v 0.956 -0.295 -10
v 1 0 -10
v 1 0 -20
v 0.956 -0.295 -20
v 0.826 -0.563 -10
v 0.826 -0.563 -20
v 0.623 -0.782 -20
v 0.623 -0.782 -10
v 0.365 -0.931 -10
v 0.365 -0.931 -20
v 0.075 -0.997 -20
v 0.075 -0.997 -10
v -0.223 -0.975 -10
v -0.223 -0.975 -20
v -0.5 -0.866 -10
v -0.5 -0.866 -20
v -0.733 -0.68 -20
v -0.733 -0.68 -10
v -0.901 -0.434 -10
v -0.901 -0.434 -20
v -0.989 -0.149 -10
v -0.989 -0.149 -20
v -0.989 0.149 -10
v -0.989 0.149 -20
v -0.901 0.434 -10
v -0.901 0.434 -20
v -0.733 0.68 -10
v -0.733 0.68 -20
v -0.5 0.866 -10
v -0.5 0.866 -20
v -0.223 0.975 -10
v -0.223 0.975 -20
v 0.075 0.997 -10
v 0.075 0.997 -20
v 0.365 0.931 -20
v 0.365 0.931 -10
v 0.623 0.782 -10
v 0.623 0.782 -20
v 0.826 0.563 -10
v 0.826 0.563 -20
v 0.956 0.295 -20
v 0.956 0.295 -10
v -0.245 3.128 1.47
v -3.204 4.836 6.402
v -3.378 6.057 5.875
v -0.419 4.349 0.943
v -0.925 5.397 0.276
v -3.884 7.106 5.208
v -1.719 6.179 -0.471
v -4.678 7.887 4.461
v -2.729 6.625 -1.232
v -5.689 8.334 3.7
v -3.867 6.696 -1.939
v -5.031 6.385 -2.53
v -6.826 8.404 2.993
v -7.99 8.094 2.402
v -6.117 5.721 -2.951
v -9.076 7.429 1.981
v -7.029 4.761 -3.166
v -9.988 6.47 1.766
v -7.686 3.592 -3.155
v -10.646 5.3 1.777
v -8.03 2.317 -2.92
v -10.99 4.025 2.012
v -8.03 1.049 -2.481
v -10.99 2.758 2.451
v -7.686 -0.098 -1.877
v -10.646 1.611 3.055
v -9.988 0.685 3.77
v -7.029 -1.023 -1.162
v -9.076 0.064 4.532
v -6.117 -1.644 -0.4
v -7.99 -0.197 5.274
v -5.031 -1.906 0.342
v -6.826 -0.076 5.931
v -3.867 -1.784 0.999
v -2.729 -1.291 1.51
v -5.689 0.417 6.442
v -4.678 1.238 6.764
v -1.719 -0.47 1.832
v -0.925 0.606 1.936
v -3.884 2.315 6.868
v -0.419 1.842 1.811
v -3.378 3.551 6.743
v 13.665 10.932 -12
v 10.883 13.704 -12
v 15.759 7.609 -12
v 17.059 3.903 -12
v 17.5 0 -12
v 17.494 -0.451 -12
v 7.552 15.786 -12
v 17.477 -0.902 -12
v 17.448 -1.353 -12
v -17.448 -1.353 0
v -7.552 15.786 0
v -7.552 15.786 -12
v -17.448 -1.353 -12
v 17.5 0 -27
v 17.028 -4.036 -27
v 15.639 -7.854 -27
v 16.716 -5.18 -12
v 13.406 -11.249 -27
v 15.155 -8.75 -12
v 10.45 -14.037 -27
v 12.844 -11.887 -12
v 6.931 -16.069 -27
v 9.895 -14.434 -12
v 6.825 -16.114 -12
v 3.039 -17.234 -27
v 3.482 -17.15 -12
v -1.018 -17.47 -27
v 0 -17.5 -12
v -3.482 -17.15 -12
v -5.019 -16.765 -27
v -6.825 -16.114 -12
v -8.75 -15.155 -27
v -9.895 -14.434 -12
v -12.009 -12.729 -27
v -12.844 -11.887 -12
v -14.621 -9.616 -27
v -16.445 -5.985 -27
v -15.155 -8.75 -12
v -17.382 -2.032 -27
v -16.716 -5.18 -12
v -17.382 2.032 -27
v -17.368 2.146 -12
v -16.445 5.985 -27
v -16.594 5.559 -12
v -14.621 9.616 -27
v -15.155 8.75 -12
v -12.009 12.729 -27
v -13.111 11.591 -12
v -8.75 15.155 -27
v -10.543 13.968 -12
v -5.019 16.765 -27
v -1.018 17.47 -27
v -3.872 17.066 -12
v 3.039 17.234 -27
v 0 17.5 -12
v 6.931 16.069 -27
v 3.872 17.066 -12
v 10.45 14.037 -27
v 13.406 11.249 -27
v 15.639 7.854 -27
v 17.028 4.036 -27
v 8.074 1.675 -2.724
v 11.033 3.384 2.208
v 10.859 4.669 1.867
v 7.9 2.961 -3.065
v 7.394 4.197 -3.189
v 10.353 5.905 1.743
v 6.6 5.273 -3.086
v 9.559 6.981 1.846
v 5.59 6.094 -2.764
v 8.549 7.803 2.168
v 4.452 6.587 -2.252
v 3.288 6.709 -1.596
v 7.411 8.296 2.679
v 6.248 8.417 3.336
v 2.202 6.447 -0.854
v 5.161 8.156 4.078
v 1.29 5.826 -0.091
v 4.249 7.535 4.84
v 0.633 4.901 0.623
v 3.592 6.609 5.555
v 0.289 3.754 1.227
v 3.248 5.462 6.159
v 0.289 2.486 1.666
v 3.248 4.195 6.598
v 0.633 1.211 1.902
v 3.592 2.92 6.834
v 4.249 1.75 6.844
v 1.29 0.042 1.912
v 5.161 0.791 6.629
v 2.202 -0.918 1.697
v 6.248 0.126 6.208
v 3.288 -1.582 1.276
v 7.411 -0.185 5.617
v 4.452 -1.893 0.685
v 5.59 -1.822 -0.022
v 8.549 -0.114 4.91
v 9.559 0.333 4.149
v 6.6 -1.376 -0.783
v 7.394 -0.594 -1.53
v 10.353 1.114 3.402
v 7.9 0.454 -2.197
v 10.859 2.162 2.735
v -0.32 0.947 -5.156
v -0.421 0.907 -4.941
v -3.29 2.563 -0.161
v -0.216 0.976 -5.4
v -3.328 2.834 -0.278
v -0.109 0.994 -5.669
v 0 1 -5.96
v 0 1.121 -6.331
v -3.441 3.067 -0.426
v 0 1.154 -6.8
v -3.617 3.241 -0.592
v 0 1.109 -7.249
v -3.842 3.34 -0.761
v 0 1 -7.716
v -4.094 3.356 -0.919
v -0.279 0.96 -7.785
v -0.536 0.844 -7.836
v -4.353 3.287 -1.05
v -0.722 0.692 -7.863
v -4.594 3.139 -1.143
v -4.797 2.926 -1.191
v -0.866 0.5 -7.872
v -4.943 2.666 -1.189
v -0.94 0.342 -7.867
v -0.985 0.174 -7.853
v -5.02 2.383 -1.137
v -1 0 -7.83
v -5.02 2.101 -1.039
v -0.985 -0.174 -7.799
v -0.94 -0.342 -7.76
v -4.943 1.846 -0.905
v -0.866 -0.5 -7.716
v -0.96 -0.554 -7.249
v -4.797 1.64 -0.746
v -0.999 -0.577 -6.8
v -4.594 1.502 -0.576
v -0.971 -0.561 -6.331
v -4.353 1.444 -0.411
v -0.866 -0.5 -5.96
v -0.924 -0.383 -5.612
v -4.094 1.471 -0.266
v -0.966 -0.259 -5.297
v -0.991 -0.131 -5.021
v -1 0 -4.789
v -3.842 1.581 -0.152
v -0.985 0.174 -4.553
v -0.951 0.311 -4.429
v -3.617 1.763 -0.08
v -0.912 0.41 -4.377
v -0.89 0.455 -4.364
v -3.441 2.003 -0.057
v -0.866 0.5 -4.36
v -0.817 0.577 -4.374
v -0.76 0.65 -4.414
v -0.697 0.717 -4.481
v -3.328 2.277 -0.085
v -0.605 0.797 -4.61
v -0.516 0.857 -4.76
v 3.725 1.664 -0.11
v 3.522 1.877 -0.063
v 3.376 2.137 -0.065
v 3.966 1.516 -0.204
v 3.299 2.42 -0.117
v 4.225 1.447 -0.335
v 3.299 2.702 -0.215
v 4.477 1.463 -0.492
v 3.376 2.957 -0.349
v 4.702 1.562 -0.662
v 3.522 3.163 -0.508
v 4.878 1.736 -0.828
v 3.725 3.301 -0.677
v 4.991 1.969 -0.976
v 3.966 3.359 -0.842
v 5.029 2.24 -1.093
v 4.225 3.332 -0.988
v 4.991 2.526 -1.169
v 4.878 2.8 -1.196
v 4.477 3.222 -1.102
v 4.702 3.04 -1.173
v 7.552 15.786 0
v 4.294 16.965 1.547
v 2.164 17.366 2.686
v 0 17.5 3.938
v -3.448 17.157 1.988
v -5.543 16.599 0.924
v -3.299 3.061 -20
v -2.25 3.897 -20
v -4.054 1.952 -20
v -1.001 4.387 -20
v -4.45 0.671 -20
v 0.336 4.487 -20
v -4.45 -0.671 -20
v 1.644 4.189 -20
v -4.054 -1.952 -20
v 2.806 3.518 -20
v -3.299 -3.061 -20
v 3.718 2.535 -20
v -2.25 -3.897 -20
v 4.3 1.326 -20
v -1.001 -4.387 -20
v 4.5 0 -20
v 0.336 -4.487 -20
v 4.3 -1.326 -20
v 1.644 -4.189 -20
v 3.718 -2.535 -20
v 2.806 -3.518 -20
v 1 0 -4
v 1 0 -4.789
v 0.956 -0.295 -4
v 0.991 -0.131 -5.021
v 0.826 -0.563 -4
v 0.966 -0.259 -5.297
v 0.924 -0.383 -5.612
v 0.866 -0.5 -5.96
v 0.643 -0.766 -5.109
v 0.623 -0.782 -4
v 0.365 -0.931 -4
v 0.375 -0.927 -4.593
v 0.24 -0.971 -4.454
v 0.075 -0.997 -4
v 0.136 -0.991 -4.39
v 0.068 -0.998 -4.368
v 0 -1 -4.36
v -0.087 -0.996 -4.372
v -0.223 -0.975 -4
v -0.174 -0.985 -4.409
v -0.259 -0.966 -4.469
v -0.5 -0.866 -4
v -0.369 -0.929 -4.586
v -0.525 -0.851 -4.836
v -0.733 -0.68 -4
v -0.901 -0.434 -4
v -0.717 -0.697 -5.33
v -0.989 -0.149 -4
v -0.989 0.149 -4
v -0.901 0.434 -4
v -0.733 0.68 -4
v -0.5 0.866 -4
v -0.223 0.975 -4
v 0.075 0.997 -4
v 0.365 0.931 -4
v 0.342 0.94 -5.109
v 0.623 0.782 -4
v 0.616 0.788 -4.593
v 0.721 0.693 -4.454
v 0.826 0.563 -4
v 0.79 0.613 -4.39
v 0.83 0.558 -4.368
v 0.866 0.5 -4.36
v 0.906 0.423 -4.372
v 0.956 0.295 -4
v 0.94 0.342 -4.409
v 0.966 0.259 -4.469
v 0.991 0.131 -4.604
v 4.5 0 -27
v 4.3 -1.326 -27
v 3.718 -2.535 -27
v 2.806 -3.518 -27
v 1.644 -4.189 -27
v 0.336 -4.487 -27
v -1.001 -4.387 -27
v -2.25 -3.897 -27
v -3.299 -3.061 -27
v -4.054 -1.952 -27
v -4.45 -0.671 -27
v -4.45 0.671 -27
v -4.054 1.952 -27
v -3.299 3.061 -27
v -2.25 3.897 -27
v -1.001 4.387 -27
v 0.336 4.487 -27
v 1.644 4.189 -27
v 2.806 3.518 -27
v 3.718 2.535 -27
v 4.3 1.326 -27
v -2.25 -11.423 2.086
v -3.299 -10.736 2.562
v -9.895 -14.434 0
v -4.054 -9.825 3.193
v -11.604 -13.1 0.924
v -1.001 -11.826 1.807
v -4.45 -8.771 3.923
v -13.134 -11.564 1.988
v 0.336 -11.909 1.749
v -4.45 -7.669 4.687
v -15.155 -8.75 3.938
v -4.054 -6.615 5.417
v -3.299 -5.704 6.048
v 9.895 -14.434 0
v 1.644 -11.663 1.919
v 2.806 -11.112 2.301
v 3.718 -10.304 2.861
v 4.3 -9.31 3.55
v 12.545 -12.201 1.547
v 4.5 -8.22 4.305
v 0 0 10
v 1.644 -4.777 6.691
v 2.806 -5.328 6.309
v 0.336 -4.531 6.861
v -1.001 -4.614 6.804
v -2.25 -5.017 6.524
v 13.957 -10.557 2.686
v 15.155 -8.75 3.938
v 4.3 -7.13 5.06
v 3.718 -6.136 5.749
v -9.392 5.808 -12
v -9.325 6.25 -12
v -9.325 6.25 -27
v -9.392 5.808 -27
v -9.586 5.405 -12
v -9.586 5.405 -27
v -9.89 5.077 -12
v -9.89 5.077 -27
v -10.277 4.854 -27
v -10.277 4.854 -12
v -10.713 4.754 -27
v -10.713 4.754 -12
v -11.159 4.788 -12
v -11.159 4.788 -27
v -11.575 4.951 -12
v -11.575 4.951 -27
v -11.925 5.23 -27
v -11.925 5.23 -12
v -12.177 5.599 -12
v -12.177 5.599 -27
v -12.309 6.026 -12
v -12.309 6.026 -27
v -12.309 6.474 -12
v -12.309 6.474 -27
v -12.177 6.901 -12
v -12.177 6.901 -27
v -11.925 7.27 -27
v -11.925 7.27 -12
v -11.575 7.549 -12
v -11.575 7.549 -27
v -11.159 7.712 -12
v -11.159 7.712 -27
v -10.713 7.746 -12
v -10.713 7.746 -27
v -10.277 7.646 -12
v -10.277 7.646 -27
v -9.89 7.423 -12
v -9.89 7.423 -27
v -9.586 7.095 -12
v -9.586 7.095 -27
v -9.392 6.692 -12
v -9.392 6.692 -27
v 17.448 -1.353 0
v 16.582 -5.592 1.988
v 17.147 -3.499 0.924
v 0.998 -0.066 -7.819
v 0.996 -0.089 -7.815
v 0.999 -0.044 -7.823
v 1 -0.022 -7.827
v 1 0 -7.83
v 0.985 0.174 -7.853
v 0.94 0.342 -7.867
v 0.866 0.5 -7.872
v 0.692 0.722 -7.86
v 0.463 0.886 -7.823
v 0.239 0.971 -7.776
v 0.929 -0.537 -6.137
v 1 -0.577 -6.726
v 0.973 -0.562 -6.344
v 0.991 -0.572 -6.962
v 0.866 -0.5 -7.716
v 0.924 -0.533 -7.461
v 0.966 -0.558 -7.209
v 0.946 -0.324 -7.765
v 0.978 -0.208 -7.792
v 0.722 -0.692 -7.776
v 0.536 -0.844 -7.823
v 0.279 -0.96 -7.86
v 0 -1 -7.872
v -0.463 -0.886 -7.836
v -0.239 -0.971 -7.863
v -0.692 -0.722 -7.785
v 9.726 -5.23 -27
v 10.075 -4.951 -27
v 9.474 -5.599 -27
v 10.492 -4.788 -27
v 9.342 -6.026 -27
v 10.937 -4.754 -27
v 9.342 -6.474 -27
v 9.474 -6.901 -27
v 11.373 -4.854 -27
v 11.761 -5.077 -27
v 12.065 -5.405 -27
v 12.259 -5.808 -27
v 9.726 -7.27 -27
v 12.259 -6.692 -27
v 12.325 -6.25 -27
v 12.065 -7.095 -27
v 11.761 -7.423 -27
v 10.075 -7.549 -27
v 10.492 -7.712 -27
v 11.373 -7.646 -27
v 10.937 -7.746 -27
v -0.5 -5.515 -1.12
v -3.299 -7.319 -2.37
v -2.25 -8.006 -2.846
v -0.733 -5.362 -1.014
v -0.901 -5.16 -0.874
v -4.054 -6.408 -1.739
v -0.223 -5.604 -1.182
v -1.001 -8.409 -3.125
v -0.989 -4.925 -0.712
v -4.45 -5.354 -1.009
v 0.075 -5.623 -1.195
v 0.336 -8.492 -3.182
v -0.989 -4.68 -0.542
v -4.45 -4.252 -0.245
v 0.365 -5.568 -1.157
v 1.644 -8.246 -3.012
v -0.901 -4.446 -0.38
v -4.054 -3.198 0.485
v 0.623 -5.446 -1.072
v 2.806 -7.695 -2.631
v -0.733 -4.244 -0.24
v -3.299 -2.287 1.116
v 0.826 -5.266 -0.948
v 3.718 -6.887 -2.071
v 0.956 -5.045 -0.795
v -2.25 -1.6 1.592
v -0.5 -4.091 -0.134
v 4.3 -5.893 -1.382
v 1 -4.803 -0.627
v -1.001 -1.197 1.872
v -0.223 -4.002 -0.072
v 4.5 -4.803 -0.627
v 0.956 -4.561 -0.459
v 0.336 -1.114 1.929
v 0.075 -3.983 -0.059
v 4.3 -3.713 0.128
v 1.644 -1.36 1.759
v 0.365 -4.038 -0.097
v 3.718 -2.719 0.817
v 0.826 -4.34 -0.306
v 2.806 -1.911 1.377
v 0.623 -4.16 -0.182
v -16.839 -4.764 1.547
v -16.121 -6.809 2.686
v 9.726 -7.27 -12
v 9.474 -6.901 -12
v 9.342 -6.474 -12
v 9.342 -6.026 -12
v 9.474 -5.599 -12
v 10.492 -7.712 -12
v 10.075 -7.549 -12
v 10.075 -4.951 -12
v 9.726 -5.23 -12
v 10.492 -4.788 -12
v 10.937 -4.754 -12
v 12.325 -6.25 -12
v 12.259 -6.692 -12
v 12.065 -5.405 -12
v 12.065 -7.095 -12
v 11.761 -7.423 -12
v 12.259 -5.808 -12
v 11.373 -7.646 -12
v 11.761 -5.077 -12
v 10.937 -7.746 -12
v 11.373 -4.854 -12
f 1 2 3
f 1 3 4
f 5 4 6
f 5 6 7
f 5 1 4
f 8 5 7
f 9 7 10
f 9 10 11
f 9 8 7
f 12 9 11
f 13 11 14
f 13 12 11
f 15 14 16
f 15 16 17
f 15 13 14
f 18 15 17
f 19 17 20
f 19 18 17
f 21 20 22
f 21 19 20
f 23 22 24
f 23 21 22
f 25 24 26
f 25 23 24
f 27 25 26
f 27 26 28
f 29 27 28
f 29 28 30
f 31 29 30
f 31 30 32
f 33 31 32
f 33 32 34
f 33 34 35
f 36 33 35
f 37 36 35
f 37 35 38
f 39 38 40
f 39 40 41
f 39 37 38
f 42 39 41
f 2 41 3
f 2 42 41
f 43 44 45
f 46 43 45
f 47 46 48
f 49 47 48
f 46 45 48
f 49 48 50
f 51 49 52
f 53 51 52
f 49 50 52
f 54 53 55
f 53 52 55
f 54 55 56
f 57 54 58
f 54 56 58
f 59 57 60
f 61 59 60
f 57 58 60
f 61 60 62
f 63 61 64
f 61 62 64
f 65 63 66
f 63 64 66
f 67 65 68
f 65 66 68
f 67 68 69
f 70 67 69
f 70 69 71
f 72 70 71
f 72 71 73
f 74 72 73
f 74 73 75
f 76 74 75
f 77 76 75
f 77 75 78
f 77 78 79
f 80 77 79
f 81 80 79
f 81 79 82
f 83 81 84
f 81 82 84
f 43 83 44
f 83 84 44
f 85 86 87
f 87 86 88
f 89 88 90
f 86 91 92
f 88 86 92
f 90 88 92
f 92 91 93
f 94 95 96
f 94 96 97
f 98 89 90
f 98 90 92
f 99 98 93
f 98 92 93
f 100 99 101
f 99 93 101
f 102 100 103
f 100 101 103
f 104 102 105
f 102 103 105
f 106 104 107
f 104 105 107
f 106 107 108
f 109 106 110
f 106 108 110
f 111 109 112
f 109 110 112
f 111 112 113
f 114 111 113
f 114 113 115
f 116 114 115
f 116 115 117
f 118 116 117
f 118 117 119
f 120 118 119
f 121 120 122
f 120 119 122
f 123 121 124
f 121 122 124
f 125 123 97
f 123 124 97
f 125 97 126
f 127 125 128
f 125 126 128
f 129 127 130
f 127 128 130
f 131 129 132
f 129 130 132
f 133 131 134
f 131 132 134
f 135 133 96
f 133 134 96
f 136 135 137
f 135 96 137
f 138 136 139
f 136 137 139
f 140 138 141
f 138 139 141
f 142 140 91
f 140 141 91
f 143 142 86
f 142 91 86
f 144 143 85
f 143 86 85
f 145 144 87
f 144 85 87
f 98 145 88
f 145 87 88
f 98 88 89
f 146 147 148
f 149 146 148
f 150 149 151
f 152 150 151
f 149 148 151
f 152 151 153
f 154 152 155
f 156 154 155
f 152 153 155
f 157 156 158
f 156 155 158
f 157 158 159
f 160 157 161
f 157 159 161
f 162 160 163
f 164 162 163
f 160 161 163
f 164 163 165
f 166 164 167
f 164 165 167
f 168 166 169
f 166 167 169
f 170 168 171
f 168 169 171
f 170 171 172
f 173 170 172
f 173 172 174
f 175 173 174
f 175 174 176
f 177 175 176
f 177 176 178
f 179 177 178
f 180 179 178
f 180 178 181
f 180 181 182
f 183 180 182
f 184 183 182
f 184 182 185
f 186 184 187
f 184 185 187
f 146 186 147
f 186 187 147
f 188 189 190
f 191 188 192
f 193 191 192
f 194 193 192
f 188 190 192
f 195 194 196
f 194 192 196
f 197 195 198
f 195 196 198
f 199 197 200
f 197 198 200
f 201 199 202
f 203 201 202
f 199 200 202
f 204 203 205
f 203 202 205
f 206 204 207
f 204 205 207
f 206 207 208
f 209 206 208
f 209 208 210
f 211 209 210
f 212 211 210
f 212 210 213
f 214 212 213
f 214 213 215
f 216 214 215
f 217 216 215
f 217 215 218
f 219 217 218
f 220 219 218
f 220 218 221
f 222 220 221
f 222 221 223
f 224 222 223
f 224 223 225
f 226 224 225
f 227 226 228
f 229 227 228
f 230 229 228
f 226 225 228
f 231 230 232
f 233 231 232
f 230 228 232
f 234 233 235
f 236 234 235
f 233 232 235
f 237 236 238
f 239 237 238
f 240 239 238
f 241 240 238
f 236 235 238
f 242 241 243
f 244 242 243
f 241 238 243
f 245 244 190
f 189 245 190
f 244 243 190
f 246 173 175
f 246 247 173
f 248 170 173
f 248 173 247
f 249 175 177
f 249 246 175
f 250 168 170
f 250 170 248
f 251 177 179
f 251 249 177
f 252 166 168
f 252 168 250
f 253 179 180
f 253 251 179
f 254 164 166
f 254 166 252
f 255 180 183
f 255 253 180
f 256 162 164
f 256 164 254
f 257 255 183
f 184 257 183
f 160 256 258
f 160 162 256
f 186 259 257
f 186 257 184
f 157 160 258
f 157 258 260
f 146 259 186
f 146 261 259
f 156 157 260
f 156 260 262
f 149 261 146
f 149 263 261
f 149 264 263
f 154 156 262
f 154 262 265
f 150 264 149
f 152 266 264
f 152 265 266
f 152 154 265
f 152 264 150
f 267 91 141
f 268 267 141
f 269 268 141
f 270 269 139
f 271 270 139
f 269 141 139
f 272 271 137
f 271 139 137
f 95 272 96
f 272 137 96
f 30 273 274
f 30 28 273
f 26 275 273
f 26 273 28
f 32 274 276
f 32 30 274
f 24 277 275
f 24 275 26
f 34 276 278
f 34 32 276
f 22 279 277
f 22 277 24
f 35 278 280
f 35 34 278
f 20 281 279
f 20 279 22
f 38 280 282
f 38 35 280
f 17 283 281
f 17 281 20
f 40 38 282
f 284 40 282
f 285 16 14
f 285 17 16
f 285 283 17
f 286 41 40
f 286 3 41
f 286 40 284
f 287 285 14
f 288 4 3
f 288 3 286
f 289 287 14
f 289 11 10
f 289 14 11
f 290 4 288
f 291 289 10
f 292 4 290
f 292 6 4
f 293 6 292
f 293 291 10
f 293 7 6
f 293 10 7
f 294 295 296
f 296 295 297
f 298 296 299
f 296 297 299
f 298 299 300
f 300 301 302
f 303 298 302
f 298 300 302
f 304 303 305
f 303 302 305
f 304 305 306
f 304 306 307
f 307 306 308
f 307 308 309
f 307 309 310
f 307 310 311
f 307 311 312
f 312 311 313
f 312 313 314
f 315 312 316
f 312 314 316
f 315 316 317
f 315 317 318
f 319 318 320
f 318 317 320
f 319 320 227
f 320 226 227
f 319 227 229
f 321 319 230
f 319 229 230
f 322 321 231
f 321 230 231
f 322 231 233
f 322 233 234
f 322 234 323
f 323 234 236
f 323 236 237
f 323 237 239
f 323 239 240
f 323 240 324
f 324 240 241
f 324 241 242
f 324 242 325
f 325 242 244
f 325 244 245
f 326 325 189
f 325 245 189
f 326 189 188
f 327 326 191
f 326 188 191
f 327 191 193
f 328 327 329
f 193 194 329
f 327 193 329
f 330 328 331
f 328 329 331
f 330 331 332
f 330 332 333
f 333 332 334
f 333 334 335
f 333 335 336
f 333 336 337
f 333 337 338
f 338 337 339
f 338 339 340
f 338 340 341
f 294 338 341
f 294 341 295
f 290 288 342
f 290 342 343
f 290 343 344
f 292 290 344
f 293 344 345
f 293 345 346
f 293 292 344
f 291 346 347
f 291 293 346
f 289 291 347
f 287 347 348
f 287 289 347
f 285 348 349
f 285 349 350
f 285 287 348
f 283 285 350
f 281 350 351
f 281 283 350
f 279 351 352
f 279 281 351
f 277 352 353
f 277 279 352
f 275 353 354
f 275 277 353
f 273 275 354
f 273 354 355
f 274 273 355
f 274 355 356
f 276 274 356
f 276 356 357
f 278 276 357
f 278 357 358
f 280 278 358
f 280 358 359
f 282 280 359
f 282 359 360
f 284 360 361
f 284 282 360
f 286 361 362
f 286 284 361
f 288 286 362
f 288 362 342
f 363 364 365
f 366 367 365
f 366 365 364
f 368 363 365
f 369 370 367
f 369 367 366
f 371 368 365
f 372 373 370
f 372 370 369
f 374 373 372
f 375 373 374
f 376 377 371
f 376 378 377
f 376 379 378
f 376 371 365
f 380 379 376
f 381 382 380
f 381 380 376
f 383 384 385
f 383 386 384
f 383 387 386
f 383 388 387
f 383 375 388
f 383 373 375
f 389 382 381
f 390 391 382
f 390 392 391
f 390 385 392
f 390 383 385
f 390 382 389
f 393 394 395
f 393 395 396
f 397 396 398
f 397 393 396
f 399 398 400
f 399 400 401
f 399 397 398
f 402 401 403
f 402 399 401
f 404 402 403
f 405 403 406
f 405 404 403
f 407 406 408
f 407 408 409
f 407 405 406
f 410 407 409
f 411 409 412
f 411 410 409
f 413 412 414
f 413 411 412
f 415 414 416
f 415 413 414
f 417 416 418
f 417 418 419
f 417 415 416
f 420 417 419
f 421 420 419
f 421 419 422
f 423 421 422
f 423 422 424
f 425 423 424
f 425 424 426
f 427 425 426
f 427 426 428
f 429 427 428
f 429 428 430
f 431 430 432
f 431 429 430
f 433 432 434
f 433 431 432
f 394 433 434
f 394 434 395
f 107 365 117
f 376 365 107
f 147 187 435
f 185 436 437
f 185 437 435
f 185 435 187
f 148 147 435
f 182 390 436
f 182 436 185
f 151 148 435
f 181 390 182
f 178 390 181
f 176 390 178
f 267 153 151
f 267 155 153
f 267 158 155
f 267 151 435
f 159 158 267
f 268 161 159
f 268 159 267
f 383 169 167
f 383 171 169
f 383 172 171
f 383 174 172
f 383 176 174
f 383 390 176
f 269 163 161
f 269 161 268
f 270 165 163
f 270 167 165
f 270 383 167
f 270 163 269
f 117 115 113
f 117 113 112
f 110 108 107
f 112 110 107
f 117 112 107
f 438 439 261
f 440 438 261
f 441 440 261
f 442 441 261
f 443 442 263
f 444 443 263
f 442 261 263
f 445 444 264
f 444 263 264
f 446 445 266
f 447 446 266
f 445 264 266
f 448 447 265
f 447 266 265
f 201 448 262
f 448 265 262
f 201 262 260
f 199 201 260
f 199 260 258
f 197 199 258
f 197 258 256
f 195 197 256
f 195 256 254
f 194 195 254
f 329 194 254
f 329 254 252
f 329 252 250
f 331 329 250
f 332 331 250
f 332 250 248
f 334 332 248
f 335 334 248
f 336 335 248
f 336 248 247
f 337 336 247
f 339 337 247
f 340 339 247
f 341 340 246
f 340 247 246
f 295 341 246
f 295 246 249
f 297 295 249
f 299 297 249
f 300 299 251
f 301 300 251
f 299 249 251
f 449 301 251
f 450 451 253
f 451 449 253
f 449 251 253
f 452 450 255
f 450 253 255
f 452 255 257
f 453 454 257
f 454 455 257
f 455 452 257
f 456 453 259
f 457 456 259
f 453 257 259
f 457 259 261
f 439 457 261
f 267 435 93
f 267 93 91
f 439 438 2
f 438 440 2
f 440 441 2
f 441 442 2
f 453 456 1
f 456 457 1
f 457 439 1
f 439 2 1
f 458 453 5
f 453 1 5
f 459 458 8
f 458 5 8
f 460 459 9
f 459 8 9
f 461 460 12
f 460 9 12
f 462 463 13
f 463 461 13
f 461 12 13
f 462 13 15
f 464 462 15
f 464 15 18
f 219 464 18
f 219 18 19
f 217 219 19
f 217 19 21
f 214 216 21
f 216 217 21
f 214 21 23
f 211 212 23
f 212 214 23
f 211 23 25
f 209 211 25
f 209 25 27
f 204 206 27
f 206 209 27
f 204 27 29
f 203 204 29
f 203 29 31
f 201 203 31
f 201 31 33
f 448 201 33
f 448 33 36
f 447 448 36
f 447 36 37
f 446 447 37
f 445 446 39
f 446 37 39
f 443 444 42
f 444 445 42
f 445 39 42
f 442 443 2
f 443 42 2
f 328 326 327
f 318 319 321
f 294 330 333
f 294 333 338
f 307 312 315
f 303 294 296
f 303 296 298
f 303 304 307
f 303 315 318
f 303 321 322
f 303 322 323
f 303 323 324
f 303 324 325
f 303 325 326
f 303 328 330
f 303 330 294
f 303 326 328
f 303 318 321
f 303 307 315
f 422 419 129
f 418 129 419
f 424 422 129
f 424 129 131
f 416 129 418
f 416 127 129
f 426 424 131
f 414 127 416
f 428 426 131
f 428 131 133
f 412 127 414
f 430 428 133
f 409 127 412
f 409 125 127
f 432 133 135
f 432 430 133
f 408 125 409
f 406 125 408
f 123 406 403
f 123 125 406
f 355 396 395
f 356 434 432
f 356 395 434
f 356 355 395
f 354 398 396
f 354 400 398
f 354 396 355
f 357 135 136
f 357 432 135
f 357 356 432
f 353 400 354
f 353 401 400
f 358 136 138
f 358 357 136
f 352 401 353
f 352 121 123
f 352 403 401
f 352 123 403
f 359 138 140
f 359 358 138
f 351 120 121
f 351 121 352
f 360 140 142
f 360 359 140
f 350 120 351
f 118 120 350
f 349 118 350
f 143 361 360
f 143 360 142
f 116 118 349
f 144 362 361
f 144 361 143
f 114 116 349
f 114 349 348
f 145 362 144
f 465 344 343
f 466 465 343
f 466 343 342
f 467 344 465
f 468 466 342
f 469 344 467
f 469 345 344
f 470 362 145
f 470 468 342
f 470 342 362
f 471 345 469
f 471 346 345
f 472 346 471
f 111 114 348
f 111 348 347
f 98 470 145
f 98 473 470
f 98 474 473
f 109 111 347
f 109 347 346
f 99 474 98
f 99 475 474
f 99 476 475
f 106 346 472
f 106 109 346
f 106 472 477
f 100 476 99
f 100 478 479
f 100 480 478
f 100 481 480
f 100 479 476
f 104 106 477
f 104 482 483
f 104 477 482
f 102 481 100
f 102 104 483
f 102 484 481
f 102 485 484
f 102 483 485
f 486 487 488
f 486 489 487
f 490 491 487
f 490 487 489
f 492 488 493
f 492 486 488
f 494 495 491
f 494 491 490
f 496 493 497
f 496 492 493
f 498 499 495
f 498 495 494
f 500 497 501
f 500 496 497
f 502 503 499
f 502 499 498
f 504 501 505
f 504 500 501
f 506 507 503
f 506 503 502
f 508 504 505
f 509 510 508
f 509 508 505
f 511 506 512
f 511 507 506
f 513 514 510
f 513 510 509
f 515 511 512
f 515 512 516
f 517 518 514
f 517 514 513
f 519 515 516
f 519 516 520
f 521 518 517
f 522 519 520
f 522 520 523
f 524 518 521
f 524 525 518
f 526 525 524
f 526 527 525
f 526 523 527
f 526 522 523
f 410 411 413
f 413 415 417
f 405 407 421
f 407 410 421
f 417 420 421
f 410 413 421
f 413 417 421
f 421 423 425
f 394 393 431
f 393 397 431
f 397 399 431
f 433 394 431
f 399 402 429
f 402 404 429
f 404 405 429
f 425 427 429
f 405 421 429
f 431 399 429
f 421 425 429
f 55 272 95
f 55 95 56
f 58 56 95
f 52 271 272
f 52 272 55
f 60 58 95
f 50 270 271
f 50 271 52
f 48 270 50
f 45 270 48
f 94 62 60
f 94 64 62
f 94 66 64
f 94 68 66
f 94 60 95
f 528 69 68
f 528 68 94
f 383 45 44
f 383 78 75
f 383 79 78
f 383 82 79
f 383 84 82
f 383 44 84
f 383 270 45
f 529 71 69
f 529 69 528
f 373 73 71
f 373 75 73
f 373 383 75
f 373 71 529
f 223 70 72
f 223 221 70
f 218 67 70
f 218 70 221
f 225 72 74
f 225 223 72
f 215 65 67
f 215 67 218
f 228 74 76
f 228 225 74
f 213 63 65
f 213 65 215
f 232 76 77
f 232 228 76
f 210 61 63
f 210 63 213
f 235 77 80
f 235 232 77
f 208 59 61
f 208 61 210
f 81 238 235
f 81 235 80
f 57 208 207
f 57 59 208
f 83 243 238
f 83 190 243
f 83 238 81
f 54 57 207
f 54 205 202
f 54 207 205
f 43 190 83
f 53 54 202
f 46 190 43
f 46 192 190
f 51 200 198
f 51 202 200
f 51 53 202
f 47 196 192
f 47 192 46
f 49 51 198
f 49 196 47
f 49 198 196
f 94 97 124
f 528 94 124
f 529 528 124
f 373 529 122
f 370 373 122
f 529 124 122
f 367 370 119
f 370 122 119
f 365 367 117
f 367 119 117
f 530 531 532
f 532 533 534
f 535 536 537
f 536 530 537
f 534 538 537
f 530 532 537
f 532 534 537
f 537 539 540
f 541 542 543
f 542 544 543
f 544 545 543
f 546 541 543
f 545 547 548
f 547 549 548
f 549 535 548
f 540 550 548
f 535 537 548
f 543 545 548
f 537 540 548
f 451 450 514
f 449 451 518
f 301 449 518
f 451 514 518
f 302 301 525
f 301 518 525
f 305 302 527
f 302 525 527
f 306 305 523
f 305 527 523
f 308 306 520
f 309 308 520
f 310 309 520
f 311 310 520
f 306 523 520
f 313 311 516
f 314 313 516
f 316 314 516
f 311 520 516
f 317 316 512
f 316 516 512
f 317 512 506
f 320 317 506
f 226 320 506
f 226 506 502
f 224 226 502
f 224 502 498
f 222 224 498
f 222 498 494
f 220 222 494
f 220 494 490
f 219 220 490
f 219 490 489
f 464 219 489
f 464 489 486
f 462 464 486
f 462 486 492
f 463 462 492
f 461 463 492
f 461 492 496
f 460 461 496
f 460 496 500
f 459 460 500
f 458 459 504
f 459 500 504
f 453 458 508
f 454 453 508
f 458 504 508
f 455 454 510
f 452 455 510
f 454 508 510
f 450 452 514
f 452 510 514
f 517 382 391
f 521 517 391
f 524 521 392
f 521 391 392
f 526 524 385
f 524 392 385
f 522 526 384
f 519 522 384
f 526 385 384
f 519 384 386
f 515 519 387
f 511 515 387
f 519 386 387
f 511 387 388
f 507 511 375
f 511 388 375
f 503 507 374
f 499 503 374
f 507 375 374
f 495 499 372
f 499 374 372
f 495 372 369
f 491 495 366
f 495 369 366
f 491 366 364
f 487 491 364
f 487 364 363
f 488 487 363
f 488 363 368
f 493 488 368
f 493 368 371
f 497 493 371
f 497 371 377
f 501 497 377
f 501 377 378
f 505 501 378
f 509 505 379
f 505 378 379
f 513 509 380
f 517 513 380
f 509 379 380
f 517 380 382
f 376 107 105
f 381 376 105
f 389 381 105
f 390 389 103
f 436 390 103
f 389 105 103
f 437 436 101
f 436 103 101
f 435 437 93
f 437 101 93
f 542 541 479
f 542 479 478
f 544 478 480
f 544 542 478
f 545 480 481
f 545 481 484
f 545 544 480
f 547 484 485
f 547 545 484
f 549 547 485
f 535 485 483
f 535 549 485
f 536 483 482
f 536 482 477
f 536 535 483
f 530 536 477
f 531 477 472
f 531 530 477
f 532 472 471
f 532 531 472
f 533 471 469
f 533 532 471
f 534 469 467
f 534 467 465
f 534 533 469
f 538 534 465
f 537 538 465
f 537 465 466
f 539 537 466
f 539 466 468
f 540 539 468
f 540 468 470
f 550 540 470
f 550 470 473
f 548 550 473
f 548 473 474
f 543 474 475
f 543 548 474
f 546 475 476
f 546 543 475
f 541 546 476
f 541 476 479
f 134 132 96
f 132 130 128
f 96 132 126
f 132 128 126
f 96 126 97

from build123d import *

# Parameters (mm, degrees)
F3_DEPTH       = 12
F8_R           = 1
F9_DEPTH       = 8
F10_R          = 4.5
F11_DEPTH      = 2
F12_R          = 1
F13_REACH      = 37.3532145158
F12_R_2        = 4.5
F14_DEPTH      = 6
F16_END_RADIUS = 1
F15_R          = 1
F16_REACH      = 37.3532145367
F15_R_2        = 4.5
F17_DEPTH      = 6
F19_END_RADIUS = 1
F18_R          = 1
F19_REACH      = 37.3532145367
F18_R_2        = 4.5
F20_DEPTH      = 6
F22_DEPTH      = 25
F23_R          = 17.5
F23_R_2        = 1.5
F23_R_3        = 6.5
F23_R_4        = 4.5
F24_DEPTH      = 15
F25_DEPTH      = 10


with BuildPart() as f3:
    # F2 (on Top) → F3 (new body)
    with BuildSketch(Plane.XY):
        Polygon((25, -14.4337567297), (0, 28.8675134595), (-25, -14.4337567297), align=None)
    extrude(amount=-F3_DEPTH)

    # F3_face (on face) → F6 section 0
    with BuildSketch(Plane.XY, mode=Mode.PRIVATE) as f6_s0:
        Polygon((-25, -14.4337567297), (25, -14.4337567297), (0, 28.8675134595), align=None)
    loft([f6_s0.sketch, Vertex(0, 0, 10)])

    # F8 (on face) → F9 (cut)
    with BuildSketch(Plane(origin=(0, 0, -12), x_dir=(1, 0, 0), z_dir=(0, 0, -1))):
        Circle(F8_R)
    extrude(amount=-F9_DEPTH, mode=Mode.SUBTRACT)

    # F10 (on face) → F11 (cut)
    with BuildSketch(Plane(origin=(0, 0, -12), x_dir=(1, 0, 0), z_dir=(0, 0, -1))):
        Circle(F10_R)
    extrude(amount=-F11_DEPTH, mode=Mode.SUBTRACT)

    f13_end = f3.faces().sort_by_distance((-1, 0, -7))[0]
    # F12 (on face) → F13 (cut, up to a face of the model that its end follows)
    with BuildSketch(Plane(origin=(0, -4.6812183988, 6.7567567568), x_dir=(1, 0, 0), z_dir=(0, -0.5694947975, 0.8219949365))):
        with Locations((0, -4.3050520255)):
            Circle(F12_R)
    f13_long = extrude(amount=-F13_REACH, mode=Mode.PRIVATE)
    add(split(f13_long, bisect_by=f13_end, keep=Keep.BOTTOM, mode=Mode.PRIVATE), mode=Mode.SUBTRACT)

    # F12 (on face) → F14 (cut)
    with BuildSketch(Plane(origin=(0, -4.6812183988, 6.7567567568), x_dir=(1, 0, 0), z_dir=(0, -0.5694947975, 0.8219949365))):
        with Locations((0, -4.3050520255)):
            Circle(F12_R_2)
        with Locations((0, -4.3050520255)):
            Circle(F12_R, mode=Mode.SUBTRACT)
    extrude(amount=-F14_DEPTH, mode=Mode.SUBTRACT)

    f16_end = (Plane(origin=(0, 0, -7), x_dir=(-1, 0, 0), z_dir=(0, 0, -1)) * Cylinder(F16_END_RADIUS, 214.1194850146, mode=Mode.PRIVATE)).faces().sort_by_distance((-1, 0, -7))[0]
    # F15 (on face) → F16 (cut, up to the whole of a round face its end follows)
    with BuildSketch(Plane(origin=(-4.0540540541, 2.3406091994, 6.7567567568), x_dir=(0.8699176724, 0.1614366008, 0.4660273245), z_dir=(-0.4931969619, 0.2847473987, 0.8219949365))):
        with Locations((-3.5228976388, 2.474401982)):
            Circle(F15_R)
    f16_long = extrude(amount=-F16_REACH, mode=Mode.PRIVATE)
    add(split(f16_long, bisect_by=f16_end, keep=Keep.ALL, mode=Mode.PRIVATE).solids().sort_by_distance((-7.1186849681, 4.1099746826, 4.3050520255))[0], mode=Mode.SUBTRACT)

    # F15 (on face) → F17 (cut)
    with BuildSketch(Plane(origin=(-4.0540540541, 2.3406091994, 6.7567567568), x_dir=(0.8699176724, 0.1614366008, 0.4660273245), z_dir=(-0.4931969619, 0.2847473987, 0.8219949365))):
        with Locations((-3.5228976388, 2.474401982)):
            Circle(F15_R_2)
        with Locations((-3.5228976388, 2.474401982)):
            Circle(F15_R, mode=Mode.SUBTRACT)
    extrude(amount=-F17_DEPTH, mode=Mode.SUBTRACT)

    f19_end = (Plane(origin=(0, 0, -7), x_dir=(-1, 0, 0), z_dir=(0, 0, -1)) * Cylinder(F19_END_RADIUS, 214.1194850146, mode=Mode.PRIVATE)).faces().sort_by_distance((-1, 0, -9.9336675042))[0]
    # F18 (on face) → F19 (cut, up to the whole of a round face its end follows)
    with BuildSketch(Plane(origin=(4.0540540541, 2.3406091994, 6.7567567568), x_dir=(0.8699176724, -0.1614366008, -0.4660273245), z_dir=(0.4931969619, 0.2847473987, 0.8219949365))):
        with Locations((3.5228976388, 2.474401982)):
            Circle(F18_R)
    f19_long = extrude(amount=-F19_REACH, mode=Mode.PRIVATE)
    add(split(f19_long, bisect_by=f19_end, keep=Keep.ALL, mode=Mode.PRIVATE).solids().sort_by_distance((7.1186849681, 4.1099746826, 4.3050520255))[0], mode=Mode.SUBTRACT)

    # F18 (on face) → F20 (cut)
    with BuildSketch(Plane(origin=(4.0540540541, 2.3406091994, 6.7567567568), x_dir=(0.8699176724, -0.1614366008, -0.4660273245), z_dir=(0.4931969619, 0.2847473987, 0.8219949365))):
        with Locations((3.5228976388, 2.474401982)):
            Circle(F18_R_2)
        with Locations((3.5228976388, 2.474401982)):
            Circle(F18_R, mode=Mode.SUBTRACT)
    extrude(amount=-F20_DEPTH, mode=Mode.SUBTRACT)

    # F21 (on face) → F22 (cut)
    with BuildSketch(Plane(origin=(0, 0, -12), x_dir=(1, 0, 0), z_dir=(0, 0, -1))):
        with BuildLine():
            Line((3.2541491538, -23.2311617897), (7.5523574637, -15.7864466154))
            ThreePointArc((7.5523574637, -15.7864466154), (0, -17.5), (-7.5523574637, -15.7864466154))
            Line((-7.5523574637, -15.7864466154), (-3.2541491538, -23.2311617897))
            ThreePointArc((-3.2541491538, -23.2311617897), (0, -23.4579701768), (3.2541491538, -23.2311617897))
        make_face()
        with BuildLine():
            ThreePointArc((-9.8952850725, 14.4337567297), (0, 17.5), (9.8952850725, 14.4337567297))
            Line((9.8952850725, 14.4337567297), (18.4917016925, 14.4337567297))
            ThreePointArc((18.4917016925, 14.4337567297), (0, 23.4579701768), (-18.4917016925, 14.4337567297))
            Line((-18.4917016925, 14.4337567297), (-9.8952850725, 14.4337567297))
        make_face()
        with BuildLine():
            ThreePointArc((-17.4476425363, 1.3526898856), (-15.1554445662, 8.75), (-9.8952850725, 14.4337567297))
            Line((-9.8952850725, 14.4337567297), (-18.4917016925, 14.4337567297))
            ThreePointArc((-18.4917016925, 14.4337567297), (-20.3151980943, 11.7289850884), (-21.7458508462, 8.79740506))
            Line((-21.7458508462, 8.79740506), (-17.4476425363, 1.3526898856))
        make_face()
        with BuildLine():
            ThreePointArc((9.8952850725, 14.4337567297), (15.1554445662, 8.75), (17.4476425363, 1.3526898856))
            Line((17.4476425363, 1.3526898856), (21.7458508462, 8.79740506))
            ThreePointArc((21.7458508462, 8.79740506), (20.3151980943, 11.7289850884), (18.4917016925, 14.4337567297))
            Line((18.4917016925, 14.4337567297), (9.8952850725, 14.4337567297))
        make_face()
        with BuildLine():
            Line((0, -28.8675134595), (3.2541491538, -23.2311617897))
            ThreePointArc((3.2541491538, -23.2311617897), (0, -23.4579701768), (-3.2541491538, -23.2311617897))
            Line((-3.2541491538, -23.2311617897), (0, -28.8675134595))
        make_face()
        with BuildLine():
            ThreePointArc((-21.7458508462, 8.79740506), (-20.3151980943, 11.7289850884), (-18.4917016925, 14.4337567297))
            Line((-18.4917016925, 14.4337567297), (-25, 14.4337567297))
            Line((-25, 14.4337567297), (-21.7458508462, 8.79740506))
        make_face()
        with BuildLine():
            ThreePointArc((18.4917016925, 14.4337567297), (20.3151980943, 11.7289850884), (21.7458508462, 8.79740506))
            Line((21.7458508462, 8.79740506), (25, 14.4337567297))
            Line((25, 14.4337567297), (18.4917016925, 14.4337567297))
        make_face()
    extrude(amount=-F22_DEPTH, mode=Mode.SUBTRACT)

    # F23 (on face) → F24 (join)
    with BuildSketch(Plane(origin=(0, 0, -12), x_dir=(1, 0, 0), z_dir=(0, 0, -1))):
        Circle(F23_R)
        with Locations((-10.8253175473, -6.25)):
            Circle(F23_R_2, mode=Mode.SUBTRACT)
        Circle(F23_R_3, mode=Mode.SUBTRACT)
        with Locations((10.8253175473, 6.25)):
            Circle(F23_R_2, mode=Mode.SUBTRACT)
        Circle(F23_R_3)
        Circle(F23_R_4, mode=Mode.SUBTRACT)
    extrude(amount=F24_DEPTH)

    # F25 (add): a face of the model
    f25_faces = [f3.faces().sort_by_distance(p)[0] for p in [
        (-4.3727207794, 0, -10),
    ]]
    extrude(f25_faces, amount=F25_DEPTH)


solid = f3.part
